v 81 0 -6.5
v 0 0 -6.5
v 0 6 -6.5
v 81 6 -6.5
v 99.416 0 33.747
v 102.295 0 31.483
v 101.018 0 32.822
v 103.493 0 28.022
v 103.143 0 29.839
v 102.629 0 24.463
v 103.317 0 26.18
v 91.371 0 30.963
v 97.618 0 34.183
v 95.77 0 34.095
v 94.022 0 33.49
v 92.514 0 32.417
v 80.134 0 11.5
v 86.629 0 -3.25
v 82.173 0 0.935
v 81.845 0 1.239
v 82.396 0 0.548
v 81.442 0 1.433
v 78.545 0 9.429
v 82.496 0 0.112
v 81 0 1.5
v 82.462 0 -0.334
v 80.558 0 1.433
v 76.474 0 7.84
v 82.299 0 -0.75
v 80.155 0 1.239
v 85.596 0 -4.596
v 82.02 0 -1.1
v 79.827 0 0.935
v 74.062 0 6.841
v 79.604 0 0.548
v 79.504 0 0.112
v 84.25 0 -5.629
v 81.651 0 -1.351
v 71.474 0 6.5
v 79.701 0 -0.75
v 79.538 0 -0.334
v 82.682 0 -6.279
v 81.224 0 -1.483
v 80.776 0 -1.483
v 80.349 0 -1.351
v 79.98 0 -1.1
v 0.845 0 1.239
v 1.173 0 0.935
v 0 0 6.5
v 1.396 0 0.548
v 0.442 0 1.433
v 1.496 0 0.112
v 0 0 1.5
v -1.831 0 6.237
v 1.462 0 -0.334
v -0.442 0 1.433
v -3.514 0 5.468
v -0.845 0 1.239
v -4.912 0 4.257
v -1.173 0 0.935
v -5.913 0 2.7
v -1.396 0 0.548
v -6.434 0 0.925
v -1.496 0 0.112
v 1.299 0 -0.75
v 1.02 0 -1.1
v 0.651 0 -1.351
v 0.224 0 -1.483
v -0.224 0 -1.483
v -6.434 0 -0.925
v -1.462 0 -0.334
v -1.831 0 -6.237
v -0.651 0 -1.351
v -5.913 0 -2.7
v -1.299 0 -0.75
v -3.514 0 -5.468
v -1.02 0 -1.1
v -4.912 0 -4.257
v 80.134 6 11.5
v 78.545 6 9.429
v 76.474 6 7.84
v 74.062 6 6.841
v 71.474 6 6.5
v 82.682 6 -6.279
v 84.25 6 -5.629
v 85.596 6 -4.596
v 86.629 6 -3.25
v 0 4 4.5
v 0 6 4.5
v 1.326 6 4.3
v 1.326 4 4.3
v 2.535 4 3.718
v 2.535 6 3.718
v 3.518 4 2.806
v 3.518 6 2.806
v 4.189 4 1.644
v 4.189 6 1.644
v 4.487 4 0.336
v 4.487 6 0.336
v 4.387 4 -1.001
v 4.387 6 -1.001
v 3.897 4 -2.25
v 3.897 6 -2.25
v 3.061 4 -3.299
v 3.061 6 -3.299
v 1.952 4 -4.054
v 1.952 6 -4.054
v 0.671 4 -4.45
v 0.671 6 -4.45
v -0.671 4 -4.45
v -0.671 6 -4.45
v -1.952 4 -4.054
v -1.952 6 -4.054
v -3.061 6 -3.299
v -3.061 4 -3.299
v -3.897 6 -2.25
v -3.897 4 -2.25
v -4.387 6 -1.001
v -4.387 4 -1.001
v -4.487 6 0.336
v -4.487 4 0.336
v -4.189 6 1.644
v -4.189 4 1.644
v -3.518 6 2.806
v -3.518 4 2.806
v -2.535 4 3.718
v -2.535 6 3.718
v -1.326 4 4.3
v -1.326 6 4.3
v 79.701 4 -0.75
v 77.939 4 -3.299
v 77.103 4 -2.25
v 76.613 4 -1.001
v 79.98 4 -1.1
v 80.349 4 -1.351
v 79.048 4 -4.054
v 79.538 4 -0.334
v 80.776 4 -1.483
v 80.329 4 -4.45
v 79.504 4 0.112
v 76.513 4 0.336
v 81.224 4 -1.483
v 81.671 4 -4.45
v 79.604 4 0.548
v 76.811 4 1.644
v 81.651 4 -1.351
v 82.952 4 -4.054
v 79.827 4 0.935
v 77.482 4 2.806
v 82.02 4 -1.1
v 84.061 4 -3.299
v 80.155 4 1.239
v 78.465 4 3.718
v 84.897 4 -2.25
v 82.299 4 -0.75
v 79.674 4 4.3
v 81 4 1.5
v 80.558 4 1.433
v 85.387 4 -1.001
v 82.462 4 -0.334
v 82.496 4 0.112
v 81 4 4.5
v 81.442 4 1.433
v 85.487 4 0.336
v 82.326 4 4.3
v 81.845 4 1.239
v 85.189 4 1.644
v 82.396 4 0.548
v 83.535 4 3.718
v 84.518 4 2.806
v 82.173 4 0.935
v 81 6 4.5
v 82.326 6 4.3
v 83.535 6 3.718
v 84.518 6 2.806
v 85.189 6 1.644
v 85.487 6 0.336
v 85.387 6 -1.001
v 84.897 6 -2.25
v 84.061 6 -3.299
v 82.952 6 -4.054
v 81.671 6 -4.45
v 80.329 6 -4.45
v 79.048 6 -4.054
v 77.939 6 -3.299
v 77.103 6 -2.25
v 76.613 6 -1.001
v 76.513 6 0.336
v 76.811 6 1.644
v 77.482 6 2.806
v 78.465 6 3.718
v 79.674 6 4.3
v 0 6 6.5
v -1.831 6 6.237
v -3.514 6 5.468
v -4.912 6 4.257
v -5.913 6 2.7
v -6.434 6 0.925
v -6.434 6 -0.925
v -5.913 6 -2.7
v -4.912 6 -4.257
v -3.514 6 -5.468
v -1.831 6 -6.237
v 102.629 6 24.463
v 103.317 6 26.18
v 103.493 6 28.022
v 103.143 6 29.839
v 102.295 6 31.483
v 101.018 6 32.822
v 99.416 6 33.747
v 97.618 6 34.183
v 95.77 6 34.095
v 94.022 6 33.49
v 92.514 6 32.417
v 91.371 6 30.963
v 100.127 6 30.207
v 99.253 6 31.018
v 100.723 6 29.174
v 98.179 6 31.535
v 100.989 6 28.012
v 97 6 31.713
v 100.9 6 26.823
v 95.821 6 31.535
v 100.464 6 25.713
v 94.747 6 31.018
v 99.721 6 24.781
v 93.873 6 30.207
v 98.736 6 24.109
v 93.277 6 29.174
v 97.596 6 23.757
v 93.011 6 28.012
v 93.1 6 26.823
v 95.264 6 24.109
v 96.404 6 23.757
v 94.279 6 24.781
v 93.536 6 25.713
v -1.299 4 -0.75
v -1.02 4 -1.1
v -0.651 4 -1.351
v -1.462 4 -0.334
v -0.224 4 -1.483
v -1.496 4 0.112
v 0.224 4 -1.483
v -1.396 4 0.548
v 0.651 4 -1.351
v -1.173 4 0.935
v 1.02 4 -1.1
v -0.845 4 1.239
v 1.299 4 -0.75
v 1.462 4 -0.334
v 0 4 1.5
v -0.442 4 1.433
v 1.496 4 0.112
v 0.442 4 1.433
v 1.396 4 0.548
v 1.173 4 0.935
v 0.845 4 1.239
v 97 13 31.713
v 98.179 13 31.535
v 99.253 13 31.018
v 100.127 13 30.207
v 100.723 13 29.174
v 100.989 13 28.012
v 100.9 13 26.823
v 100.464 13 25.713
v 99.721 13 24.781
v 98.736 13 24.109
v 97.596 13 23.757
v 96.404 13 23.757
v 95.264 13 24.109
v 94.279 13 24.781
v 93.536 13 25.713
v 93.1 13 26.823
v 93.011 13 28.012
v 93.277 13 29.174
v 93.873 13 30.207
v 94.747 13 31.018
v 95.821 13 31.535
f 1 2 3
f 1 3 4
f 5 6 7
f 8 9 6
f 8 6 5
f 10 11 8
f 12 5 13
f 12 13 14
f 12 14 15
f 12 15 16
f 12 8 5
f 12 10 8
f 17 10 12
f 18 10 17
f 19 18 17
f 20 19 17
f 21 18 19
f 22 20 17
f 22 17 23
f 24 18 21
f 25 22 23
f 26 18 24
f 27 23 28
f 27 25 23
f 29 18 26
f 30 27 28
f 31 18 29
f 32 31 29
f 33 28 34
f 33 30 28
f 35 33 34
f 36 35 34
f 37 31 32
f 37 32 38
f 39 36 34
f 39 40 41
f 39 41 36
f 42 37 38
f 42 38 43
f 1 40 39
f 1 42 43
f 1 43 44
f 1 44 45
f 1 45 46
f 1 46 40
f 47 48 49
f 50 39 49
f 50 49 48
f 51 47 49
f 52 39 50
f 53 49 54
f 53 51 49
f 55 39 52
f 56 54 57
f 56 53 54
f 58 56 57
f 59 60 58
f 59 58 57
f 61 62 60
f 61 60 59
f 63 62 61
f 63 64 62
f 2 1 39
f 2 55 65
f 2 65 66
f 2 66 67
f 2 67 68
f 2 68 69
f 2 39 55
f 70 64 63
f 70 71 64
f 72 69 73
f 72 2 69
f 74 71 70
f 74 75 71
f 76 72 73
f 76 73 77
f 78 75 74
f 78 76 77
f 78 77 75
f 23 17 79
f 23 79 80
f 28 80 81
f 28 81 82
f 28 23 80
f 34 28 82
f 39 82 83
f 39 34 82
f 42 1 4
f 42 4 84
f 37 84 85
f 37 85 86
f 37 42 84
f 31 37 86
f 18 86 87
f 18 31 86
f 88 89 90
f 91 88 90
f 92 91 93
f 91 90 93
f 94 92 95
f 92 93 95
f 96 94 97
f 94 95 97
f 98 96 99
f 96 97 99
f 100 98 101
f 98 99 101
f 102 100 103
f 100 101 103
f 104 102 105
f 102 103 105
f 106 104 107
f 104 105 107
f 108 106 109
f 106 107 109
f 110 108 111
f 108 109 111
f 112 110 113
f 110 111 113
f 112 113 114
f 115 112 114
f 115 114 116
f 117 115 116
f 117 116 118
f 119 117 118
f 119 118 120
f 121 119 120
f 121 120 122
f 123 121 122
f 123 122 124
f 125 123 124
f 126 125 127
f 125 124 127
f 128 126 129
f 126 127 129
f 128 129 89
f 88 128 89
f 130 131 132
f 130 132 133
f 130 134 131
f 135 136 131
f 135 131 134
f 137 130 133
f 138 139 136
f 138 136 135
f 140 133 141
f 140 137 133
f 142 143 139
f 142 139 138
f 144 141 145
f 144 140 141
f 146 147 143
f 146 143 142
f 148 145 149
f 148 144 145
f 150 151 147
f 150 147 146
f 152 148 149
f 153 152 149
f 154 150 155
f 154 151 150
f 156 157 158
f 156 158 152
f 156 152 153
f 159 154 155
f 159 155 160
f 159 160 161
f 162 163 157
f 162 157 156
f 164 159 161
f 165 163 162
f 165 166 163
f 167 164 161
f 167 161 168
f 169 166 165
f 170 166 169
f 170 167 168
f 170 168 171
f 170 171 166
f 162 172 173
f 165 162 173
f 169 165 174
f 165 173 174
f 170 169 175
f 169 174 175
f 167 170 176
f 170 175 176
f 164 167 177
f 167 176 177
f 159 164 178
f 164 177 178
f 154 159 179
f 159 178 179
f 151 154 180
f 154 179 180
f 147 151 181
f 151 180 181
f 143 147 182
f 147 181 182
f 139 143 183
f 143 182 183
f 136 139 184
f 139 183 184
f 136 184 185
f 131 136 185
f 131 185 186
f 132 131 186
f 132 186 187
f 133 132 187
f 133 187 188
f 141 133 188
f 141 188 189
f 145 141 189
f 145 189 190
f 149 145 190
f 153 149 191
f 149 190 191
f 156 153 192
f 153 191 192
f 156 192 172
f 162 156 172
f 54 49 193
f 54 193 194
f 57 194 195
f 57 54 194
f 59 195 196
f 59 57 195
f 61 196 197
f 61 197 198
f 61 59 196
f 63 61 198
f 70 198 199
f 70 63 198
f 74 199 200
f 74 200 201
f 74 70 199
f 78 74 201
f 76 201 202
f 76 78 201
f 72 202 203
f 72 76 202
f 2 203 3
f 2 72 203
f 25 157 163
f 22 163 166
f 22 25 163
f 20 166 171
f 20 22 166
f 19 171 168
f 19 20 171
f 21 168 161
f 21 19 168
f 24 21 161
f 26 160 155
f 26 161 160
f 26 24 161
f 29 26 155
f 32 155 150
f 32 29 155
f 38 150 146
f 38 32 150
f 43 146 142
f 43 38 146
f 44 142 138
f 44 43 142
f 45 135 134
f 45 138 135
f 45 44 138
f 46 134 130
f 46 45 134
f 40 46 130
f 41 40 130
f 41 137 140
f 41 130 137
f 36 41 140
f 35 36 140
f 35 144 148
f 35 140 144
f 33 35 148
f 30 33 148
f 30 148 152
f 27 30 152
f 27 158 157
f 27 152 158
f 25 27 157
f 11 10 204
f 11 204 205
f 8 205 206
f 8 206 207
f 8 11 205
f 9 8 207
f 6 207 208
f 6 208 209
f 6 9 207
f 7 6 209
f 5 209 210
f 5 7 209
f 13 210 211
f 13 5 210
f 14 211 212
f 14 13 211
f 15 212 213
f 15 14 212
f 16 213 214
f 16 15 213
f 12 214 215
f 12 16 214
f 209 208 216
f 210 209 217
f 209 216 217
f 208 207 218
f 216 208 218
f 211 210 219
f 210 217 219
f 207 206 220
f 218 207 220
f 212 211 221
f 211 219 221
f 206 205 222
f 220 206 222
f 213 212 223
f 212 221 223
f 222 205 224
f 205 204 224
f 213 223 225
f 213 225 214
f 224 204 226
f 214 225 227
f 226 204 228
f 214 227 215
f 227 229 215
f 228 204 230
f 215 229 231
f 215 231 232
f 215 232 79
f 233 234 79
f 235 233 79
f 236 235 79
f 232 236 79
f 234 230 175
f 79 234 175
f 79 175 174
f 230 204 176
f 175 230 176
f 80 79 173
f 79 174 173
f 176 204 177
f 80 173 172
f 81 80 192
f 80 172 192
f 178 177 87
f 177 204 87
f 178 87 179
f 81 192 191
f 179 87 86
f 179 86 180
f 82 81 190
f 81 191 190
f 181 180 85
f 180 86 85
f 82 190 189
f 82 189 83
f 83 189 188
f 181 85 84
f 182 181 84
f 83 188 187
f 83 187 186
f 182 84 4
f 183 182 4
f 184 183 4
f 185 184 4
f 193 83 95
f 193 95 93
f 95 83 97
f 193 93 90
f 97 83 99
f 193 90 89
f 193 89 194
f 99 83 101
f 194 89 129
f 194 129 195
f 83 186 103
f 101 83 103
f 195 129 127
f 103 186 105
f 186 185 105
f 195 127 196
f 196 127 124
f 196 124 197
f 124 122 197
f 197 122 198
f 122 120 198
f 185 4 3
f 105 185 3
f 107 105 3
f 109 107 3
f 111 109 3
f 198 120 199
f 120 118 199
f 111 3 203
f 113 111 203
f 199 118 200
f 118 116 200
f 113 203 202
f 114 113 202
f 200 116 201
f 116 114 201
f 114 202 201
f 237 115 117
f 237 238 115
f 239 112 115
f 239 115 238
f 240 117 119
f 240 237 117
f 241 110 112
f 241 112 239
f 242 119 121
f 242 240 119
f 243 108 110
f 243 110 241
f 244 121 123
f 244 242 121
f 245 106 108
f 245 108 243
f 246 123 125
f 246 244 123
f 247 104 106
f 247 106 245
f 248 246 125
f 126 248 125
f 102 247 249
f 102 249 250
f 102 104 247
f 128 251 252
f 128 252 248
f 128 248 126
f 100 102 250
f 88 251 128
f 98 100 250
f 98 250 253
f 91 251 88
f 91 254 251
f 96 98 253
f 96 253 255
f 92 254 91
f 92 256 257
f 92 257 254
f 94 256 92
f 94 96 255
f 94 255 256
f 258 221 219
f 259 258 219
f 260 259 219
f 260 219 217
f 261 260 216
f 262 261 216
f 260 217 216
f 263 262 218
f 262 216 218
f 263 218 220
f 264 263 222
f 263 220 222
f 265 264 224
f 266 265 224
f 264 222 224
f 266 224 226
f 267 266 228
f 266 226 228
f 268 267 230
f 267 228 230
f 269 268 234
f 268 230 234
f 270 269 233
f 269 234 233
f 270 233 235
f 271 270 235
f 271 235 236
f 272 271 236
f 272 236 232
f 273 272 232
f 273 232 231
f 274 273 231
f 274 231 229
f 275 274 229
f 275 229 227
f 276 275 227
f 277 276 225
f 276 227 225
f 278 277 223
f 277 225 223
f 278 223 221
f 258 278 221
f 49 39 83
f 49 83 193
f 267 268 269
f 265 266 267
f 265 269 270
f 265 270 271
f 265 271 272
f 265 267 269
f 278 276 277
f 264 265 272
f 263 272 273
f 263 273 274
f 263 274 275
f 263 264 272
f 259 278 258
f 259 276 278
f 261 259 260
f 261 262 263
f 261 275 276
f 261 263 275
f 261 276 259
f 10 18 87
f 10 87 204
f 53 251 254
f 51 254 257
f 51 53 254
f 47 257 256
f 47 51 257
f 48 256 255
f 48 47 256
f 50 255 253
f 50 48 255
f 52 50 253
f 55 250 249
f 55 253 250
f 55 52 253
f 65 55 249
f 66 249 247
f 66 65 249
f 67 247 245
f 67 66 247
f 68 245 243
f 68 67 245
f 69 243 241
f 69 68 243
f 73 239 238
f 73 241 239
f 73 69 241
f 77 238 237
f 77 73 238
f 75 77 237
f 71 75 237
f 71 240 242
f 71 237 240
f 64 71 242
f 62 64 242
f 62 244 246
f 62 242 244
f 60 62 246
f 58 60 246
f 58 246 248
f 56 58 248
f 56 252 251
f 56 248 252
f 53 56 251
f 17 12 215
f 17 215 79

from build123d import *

# Parameters (mm, degrees)
SKETCH1_R           = 1.5
BOSS_EXTRUDE1_DEPTH = 6
SKETCH2_R           = 4.5
CUT_EXTRUDE1_DEPTH  = 2
SKETCH3_R           = 4
BOSS_EXTRUDE2_DEPTH = 7


with BuildPart() as part:
    # Sketch1 → Boss-Extrude1 (new body)
    with BuildSketch(Plane(origin=(0, 0, 0), x_dir=(1, 0, 0), z_dir=(0, 1, 0))):
        with BuildLine():
            Line((0, 6.5), (81, 6.5))
            ThreePointArc((81, 6.5), (84.25, 5.629165125), (86.629165125, 3.25))
            Line((86.629165125, 3.25), (102.629165125, -24.462812921))
            ThreePointArc((102.629165125, -24.462812921), (100.25, -33.341978046), (91.370834875, -30.962812921))
            Line((91.370834875, -30.962812921), (80.133974596, -11.5))
            ThreePointArc((80.133974596, -11.5), (76.473720558, -7.839745962), (71.473720558, -6.5))
            Line((71.473720558, -6.5), (0, -6.5))
            ThreePointArc((0, -6.5), (-6.5, 0), (0, 6.5))
        make_face()
        with Locations(Location((0, 0, 0), (0, 0, 270))):
            Circle(SKETCH1_R, mode=Mode.SUBTRACT)
        with Locations(Location((81, 0, 0), (0, 0, 270))):
            Circle(SKETCH1_R, mode=Mode.SUBTRACT)
    extrude(amount=BOSS_EXTRUDE1_DEPTH)

    # Sketch2 → Cut-Extrude1 (cut)
    with BuildSketch(Plane(origin=(0, 6, 0), x_dir=(1, 0, 0), z_dir=(0, 1, 0))):
        with Locations(Location((0, 0, 0), (0, 0, 270))):
            Circle(SKETCH2_R)
        with Locations(Location((81, 0, 0), (0, 0, 270))):
            Circle(SKETCH2_R)
    extrude(amount=-CUT_EXTRUDE1_DEPTH, mode=Mode.SUBTRACT)

    # Sketch3 → Boss-Extrude2 (add)
    with BuildSketch(Plane(origin=(0, 6, 0), x_dir=(1, 0, 0), z_dir=(0, 1, 0))):
        with Locations(Location((97, -27.712812921, 0), (0, 0, 270))):
            Circle(SKETCH3_R)
    extrude(amount=BOSS_EXTRUDE2_DEPTH)


solid = part.part
